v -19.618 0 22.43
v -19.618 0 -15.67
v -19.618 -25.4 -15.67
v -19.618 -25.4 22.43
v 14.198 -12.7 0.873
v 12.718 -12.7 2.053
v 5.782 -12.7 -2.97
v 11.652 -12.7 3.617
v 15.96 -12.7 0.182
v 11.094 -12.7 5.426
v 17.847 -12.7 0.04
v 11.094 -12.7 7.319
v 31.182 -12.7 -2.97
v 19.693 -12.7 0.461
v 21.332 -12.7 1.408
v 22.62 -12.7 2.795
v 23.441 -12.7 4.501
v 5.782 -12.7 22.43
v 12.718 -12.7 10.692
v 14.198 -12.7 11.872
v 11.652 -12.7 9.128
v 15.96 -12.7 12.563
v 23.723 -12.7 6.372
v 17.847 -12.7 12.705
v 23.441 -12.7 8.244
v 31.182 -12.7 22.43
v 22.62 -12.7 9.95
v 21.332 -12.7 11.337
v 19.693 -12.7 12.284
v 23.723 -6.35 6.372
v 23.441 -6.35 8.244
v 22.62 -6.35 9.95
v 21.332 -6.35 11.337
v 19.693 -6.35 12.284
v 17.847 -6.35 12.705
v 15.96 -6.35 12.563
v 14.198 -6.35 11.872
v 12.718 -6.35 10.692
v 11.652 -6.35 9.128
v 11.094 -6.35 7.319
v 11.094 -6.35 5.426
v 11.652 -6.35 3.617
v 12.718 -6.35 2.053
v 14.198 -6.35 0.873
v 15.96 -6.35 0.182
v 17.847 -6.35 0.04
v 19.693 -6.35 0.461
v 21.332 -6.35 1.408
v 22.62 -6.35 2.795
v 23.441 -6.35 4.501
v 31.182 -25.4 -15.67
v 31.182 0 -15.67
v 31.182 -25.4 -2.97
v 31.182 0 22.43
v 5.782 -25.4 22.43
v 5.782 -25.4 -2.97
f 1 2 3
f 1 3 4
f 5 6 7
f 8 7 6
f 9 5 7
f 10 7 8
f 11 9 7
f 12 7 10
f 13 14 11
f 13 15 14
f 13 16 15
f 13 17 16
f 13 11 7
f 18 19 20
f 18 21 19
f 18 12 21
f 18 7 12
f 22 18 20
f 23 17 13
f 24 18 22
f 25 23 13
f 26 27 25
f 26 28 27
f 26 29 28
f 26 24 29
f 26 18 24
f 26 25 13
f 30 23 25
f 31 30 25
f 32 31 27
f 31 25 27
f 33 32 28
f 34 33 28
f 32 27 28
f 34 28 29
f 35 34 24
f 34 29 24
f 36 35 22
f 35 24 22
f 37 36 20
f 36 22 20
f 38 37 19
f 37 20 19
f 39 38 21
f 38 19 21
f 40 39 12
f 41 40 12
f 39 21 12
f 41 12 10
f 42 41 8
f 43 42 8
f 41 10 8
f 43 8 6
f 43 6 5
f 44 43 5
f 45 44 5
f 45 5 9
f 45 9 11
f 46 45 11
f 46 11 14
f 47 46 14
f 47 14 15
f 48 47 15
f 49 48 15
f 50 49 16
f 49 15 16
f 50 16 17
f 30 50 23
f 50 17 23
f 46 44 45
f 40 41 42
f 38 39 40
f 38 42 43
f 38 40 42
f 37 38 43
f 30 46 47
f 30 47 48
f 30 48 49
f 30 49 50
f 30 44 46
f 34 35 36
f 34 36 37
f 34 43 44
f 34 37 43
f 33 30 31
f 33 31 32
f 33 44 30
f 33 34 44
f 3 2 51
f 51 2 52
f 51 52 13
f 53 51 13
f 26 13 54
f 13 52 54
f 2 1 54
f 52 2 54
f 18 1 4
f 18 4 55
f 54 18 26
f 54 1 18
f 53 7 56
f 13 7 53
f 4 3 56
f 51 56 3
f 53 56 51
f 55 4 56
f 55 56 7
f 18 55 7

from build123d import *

# Parameters (mm, degrees)
F0_W     = 50.8
F0_H     = 38.1
F1_DEPTH = 25.4
F2_W     = 25.4
F2_H     = 12.7
F3_DEPTH = 25.4
F4_R     = 6.35
F5_DEPTH = 6.35


with BuildPart() as f1:
    # F0 (on Front) → F1 (new body)
    with BuildSketch(Plane.XZ):
        with Locations((5.782433, 3.379637)):
            Rectangle(F0_W, F0_H)
    extrude(amount=F1_DEPTH)

    # F2 (on face) → F3 (cut)
    with BuildSketch(Plane.XY.offset(22.429637)):
        with Locations((18.482433, -19.05)):
            Rectangle(F2_W, F2_H)
    extrude(amount=-F3_DEPTH, mode=Mode.SUBTRACT)

    # F4 (on face) → F5 (cut)
    with BuildSketch(Plane.XZ.offset(12.7)):
        with Locations((17.372906, 6.372478)):
            Circle(F4_R)
    extrude(amount=-F5_DEPTH, mode=Mode.SUBTRACT)


solid = f1.part
